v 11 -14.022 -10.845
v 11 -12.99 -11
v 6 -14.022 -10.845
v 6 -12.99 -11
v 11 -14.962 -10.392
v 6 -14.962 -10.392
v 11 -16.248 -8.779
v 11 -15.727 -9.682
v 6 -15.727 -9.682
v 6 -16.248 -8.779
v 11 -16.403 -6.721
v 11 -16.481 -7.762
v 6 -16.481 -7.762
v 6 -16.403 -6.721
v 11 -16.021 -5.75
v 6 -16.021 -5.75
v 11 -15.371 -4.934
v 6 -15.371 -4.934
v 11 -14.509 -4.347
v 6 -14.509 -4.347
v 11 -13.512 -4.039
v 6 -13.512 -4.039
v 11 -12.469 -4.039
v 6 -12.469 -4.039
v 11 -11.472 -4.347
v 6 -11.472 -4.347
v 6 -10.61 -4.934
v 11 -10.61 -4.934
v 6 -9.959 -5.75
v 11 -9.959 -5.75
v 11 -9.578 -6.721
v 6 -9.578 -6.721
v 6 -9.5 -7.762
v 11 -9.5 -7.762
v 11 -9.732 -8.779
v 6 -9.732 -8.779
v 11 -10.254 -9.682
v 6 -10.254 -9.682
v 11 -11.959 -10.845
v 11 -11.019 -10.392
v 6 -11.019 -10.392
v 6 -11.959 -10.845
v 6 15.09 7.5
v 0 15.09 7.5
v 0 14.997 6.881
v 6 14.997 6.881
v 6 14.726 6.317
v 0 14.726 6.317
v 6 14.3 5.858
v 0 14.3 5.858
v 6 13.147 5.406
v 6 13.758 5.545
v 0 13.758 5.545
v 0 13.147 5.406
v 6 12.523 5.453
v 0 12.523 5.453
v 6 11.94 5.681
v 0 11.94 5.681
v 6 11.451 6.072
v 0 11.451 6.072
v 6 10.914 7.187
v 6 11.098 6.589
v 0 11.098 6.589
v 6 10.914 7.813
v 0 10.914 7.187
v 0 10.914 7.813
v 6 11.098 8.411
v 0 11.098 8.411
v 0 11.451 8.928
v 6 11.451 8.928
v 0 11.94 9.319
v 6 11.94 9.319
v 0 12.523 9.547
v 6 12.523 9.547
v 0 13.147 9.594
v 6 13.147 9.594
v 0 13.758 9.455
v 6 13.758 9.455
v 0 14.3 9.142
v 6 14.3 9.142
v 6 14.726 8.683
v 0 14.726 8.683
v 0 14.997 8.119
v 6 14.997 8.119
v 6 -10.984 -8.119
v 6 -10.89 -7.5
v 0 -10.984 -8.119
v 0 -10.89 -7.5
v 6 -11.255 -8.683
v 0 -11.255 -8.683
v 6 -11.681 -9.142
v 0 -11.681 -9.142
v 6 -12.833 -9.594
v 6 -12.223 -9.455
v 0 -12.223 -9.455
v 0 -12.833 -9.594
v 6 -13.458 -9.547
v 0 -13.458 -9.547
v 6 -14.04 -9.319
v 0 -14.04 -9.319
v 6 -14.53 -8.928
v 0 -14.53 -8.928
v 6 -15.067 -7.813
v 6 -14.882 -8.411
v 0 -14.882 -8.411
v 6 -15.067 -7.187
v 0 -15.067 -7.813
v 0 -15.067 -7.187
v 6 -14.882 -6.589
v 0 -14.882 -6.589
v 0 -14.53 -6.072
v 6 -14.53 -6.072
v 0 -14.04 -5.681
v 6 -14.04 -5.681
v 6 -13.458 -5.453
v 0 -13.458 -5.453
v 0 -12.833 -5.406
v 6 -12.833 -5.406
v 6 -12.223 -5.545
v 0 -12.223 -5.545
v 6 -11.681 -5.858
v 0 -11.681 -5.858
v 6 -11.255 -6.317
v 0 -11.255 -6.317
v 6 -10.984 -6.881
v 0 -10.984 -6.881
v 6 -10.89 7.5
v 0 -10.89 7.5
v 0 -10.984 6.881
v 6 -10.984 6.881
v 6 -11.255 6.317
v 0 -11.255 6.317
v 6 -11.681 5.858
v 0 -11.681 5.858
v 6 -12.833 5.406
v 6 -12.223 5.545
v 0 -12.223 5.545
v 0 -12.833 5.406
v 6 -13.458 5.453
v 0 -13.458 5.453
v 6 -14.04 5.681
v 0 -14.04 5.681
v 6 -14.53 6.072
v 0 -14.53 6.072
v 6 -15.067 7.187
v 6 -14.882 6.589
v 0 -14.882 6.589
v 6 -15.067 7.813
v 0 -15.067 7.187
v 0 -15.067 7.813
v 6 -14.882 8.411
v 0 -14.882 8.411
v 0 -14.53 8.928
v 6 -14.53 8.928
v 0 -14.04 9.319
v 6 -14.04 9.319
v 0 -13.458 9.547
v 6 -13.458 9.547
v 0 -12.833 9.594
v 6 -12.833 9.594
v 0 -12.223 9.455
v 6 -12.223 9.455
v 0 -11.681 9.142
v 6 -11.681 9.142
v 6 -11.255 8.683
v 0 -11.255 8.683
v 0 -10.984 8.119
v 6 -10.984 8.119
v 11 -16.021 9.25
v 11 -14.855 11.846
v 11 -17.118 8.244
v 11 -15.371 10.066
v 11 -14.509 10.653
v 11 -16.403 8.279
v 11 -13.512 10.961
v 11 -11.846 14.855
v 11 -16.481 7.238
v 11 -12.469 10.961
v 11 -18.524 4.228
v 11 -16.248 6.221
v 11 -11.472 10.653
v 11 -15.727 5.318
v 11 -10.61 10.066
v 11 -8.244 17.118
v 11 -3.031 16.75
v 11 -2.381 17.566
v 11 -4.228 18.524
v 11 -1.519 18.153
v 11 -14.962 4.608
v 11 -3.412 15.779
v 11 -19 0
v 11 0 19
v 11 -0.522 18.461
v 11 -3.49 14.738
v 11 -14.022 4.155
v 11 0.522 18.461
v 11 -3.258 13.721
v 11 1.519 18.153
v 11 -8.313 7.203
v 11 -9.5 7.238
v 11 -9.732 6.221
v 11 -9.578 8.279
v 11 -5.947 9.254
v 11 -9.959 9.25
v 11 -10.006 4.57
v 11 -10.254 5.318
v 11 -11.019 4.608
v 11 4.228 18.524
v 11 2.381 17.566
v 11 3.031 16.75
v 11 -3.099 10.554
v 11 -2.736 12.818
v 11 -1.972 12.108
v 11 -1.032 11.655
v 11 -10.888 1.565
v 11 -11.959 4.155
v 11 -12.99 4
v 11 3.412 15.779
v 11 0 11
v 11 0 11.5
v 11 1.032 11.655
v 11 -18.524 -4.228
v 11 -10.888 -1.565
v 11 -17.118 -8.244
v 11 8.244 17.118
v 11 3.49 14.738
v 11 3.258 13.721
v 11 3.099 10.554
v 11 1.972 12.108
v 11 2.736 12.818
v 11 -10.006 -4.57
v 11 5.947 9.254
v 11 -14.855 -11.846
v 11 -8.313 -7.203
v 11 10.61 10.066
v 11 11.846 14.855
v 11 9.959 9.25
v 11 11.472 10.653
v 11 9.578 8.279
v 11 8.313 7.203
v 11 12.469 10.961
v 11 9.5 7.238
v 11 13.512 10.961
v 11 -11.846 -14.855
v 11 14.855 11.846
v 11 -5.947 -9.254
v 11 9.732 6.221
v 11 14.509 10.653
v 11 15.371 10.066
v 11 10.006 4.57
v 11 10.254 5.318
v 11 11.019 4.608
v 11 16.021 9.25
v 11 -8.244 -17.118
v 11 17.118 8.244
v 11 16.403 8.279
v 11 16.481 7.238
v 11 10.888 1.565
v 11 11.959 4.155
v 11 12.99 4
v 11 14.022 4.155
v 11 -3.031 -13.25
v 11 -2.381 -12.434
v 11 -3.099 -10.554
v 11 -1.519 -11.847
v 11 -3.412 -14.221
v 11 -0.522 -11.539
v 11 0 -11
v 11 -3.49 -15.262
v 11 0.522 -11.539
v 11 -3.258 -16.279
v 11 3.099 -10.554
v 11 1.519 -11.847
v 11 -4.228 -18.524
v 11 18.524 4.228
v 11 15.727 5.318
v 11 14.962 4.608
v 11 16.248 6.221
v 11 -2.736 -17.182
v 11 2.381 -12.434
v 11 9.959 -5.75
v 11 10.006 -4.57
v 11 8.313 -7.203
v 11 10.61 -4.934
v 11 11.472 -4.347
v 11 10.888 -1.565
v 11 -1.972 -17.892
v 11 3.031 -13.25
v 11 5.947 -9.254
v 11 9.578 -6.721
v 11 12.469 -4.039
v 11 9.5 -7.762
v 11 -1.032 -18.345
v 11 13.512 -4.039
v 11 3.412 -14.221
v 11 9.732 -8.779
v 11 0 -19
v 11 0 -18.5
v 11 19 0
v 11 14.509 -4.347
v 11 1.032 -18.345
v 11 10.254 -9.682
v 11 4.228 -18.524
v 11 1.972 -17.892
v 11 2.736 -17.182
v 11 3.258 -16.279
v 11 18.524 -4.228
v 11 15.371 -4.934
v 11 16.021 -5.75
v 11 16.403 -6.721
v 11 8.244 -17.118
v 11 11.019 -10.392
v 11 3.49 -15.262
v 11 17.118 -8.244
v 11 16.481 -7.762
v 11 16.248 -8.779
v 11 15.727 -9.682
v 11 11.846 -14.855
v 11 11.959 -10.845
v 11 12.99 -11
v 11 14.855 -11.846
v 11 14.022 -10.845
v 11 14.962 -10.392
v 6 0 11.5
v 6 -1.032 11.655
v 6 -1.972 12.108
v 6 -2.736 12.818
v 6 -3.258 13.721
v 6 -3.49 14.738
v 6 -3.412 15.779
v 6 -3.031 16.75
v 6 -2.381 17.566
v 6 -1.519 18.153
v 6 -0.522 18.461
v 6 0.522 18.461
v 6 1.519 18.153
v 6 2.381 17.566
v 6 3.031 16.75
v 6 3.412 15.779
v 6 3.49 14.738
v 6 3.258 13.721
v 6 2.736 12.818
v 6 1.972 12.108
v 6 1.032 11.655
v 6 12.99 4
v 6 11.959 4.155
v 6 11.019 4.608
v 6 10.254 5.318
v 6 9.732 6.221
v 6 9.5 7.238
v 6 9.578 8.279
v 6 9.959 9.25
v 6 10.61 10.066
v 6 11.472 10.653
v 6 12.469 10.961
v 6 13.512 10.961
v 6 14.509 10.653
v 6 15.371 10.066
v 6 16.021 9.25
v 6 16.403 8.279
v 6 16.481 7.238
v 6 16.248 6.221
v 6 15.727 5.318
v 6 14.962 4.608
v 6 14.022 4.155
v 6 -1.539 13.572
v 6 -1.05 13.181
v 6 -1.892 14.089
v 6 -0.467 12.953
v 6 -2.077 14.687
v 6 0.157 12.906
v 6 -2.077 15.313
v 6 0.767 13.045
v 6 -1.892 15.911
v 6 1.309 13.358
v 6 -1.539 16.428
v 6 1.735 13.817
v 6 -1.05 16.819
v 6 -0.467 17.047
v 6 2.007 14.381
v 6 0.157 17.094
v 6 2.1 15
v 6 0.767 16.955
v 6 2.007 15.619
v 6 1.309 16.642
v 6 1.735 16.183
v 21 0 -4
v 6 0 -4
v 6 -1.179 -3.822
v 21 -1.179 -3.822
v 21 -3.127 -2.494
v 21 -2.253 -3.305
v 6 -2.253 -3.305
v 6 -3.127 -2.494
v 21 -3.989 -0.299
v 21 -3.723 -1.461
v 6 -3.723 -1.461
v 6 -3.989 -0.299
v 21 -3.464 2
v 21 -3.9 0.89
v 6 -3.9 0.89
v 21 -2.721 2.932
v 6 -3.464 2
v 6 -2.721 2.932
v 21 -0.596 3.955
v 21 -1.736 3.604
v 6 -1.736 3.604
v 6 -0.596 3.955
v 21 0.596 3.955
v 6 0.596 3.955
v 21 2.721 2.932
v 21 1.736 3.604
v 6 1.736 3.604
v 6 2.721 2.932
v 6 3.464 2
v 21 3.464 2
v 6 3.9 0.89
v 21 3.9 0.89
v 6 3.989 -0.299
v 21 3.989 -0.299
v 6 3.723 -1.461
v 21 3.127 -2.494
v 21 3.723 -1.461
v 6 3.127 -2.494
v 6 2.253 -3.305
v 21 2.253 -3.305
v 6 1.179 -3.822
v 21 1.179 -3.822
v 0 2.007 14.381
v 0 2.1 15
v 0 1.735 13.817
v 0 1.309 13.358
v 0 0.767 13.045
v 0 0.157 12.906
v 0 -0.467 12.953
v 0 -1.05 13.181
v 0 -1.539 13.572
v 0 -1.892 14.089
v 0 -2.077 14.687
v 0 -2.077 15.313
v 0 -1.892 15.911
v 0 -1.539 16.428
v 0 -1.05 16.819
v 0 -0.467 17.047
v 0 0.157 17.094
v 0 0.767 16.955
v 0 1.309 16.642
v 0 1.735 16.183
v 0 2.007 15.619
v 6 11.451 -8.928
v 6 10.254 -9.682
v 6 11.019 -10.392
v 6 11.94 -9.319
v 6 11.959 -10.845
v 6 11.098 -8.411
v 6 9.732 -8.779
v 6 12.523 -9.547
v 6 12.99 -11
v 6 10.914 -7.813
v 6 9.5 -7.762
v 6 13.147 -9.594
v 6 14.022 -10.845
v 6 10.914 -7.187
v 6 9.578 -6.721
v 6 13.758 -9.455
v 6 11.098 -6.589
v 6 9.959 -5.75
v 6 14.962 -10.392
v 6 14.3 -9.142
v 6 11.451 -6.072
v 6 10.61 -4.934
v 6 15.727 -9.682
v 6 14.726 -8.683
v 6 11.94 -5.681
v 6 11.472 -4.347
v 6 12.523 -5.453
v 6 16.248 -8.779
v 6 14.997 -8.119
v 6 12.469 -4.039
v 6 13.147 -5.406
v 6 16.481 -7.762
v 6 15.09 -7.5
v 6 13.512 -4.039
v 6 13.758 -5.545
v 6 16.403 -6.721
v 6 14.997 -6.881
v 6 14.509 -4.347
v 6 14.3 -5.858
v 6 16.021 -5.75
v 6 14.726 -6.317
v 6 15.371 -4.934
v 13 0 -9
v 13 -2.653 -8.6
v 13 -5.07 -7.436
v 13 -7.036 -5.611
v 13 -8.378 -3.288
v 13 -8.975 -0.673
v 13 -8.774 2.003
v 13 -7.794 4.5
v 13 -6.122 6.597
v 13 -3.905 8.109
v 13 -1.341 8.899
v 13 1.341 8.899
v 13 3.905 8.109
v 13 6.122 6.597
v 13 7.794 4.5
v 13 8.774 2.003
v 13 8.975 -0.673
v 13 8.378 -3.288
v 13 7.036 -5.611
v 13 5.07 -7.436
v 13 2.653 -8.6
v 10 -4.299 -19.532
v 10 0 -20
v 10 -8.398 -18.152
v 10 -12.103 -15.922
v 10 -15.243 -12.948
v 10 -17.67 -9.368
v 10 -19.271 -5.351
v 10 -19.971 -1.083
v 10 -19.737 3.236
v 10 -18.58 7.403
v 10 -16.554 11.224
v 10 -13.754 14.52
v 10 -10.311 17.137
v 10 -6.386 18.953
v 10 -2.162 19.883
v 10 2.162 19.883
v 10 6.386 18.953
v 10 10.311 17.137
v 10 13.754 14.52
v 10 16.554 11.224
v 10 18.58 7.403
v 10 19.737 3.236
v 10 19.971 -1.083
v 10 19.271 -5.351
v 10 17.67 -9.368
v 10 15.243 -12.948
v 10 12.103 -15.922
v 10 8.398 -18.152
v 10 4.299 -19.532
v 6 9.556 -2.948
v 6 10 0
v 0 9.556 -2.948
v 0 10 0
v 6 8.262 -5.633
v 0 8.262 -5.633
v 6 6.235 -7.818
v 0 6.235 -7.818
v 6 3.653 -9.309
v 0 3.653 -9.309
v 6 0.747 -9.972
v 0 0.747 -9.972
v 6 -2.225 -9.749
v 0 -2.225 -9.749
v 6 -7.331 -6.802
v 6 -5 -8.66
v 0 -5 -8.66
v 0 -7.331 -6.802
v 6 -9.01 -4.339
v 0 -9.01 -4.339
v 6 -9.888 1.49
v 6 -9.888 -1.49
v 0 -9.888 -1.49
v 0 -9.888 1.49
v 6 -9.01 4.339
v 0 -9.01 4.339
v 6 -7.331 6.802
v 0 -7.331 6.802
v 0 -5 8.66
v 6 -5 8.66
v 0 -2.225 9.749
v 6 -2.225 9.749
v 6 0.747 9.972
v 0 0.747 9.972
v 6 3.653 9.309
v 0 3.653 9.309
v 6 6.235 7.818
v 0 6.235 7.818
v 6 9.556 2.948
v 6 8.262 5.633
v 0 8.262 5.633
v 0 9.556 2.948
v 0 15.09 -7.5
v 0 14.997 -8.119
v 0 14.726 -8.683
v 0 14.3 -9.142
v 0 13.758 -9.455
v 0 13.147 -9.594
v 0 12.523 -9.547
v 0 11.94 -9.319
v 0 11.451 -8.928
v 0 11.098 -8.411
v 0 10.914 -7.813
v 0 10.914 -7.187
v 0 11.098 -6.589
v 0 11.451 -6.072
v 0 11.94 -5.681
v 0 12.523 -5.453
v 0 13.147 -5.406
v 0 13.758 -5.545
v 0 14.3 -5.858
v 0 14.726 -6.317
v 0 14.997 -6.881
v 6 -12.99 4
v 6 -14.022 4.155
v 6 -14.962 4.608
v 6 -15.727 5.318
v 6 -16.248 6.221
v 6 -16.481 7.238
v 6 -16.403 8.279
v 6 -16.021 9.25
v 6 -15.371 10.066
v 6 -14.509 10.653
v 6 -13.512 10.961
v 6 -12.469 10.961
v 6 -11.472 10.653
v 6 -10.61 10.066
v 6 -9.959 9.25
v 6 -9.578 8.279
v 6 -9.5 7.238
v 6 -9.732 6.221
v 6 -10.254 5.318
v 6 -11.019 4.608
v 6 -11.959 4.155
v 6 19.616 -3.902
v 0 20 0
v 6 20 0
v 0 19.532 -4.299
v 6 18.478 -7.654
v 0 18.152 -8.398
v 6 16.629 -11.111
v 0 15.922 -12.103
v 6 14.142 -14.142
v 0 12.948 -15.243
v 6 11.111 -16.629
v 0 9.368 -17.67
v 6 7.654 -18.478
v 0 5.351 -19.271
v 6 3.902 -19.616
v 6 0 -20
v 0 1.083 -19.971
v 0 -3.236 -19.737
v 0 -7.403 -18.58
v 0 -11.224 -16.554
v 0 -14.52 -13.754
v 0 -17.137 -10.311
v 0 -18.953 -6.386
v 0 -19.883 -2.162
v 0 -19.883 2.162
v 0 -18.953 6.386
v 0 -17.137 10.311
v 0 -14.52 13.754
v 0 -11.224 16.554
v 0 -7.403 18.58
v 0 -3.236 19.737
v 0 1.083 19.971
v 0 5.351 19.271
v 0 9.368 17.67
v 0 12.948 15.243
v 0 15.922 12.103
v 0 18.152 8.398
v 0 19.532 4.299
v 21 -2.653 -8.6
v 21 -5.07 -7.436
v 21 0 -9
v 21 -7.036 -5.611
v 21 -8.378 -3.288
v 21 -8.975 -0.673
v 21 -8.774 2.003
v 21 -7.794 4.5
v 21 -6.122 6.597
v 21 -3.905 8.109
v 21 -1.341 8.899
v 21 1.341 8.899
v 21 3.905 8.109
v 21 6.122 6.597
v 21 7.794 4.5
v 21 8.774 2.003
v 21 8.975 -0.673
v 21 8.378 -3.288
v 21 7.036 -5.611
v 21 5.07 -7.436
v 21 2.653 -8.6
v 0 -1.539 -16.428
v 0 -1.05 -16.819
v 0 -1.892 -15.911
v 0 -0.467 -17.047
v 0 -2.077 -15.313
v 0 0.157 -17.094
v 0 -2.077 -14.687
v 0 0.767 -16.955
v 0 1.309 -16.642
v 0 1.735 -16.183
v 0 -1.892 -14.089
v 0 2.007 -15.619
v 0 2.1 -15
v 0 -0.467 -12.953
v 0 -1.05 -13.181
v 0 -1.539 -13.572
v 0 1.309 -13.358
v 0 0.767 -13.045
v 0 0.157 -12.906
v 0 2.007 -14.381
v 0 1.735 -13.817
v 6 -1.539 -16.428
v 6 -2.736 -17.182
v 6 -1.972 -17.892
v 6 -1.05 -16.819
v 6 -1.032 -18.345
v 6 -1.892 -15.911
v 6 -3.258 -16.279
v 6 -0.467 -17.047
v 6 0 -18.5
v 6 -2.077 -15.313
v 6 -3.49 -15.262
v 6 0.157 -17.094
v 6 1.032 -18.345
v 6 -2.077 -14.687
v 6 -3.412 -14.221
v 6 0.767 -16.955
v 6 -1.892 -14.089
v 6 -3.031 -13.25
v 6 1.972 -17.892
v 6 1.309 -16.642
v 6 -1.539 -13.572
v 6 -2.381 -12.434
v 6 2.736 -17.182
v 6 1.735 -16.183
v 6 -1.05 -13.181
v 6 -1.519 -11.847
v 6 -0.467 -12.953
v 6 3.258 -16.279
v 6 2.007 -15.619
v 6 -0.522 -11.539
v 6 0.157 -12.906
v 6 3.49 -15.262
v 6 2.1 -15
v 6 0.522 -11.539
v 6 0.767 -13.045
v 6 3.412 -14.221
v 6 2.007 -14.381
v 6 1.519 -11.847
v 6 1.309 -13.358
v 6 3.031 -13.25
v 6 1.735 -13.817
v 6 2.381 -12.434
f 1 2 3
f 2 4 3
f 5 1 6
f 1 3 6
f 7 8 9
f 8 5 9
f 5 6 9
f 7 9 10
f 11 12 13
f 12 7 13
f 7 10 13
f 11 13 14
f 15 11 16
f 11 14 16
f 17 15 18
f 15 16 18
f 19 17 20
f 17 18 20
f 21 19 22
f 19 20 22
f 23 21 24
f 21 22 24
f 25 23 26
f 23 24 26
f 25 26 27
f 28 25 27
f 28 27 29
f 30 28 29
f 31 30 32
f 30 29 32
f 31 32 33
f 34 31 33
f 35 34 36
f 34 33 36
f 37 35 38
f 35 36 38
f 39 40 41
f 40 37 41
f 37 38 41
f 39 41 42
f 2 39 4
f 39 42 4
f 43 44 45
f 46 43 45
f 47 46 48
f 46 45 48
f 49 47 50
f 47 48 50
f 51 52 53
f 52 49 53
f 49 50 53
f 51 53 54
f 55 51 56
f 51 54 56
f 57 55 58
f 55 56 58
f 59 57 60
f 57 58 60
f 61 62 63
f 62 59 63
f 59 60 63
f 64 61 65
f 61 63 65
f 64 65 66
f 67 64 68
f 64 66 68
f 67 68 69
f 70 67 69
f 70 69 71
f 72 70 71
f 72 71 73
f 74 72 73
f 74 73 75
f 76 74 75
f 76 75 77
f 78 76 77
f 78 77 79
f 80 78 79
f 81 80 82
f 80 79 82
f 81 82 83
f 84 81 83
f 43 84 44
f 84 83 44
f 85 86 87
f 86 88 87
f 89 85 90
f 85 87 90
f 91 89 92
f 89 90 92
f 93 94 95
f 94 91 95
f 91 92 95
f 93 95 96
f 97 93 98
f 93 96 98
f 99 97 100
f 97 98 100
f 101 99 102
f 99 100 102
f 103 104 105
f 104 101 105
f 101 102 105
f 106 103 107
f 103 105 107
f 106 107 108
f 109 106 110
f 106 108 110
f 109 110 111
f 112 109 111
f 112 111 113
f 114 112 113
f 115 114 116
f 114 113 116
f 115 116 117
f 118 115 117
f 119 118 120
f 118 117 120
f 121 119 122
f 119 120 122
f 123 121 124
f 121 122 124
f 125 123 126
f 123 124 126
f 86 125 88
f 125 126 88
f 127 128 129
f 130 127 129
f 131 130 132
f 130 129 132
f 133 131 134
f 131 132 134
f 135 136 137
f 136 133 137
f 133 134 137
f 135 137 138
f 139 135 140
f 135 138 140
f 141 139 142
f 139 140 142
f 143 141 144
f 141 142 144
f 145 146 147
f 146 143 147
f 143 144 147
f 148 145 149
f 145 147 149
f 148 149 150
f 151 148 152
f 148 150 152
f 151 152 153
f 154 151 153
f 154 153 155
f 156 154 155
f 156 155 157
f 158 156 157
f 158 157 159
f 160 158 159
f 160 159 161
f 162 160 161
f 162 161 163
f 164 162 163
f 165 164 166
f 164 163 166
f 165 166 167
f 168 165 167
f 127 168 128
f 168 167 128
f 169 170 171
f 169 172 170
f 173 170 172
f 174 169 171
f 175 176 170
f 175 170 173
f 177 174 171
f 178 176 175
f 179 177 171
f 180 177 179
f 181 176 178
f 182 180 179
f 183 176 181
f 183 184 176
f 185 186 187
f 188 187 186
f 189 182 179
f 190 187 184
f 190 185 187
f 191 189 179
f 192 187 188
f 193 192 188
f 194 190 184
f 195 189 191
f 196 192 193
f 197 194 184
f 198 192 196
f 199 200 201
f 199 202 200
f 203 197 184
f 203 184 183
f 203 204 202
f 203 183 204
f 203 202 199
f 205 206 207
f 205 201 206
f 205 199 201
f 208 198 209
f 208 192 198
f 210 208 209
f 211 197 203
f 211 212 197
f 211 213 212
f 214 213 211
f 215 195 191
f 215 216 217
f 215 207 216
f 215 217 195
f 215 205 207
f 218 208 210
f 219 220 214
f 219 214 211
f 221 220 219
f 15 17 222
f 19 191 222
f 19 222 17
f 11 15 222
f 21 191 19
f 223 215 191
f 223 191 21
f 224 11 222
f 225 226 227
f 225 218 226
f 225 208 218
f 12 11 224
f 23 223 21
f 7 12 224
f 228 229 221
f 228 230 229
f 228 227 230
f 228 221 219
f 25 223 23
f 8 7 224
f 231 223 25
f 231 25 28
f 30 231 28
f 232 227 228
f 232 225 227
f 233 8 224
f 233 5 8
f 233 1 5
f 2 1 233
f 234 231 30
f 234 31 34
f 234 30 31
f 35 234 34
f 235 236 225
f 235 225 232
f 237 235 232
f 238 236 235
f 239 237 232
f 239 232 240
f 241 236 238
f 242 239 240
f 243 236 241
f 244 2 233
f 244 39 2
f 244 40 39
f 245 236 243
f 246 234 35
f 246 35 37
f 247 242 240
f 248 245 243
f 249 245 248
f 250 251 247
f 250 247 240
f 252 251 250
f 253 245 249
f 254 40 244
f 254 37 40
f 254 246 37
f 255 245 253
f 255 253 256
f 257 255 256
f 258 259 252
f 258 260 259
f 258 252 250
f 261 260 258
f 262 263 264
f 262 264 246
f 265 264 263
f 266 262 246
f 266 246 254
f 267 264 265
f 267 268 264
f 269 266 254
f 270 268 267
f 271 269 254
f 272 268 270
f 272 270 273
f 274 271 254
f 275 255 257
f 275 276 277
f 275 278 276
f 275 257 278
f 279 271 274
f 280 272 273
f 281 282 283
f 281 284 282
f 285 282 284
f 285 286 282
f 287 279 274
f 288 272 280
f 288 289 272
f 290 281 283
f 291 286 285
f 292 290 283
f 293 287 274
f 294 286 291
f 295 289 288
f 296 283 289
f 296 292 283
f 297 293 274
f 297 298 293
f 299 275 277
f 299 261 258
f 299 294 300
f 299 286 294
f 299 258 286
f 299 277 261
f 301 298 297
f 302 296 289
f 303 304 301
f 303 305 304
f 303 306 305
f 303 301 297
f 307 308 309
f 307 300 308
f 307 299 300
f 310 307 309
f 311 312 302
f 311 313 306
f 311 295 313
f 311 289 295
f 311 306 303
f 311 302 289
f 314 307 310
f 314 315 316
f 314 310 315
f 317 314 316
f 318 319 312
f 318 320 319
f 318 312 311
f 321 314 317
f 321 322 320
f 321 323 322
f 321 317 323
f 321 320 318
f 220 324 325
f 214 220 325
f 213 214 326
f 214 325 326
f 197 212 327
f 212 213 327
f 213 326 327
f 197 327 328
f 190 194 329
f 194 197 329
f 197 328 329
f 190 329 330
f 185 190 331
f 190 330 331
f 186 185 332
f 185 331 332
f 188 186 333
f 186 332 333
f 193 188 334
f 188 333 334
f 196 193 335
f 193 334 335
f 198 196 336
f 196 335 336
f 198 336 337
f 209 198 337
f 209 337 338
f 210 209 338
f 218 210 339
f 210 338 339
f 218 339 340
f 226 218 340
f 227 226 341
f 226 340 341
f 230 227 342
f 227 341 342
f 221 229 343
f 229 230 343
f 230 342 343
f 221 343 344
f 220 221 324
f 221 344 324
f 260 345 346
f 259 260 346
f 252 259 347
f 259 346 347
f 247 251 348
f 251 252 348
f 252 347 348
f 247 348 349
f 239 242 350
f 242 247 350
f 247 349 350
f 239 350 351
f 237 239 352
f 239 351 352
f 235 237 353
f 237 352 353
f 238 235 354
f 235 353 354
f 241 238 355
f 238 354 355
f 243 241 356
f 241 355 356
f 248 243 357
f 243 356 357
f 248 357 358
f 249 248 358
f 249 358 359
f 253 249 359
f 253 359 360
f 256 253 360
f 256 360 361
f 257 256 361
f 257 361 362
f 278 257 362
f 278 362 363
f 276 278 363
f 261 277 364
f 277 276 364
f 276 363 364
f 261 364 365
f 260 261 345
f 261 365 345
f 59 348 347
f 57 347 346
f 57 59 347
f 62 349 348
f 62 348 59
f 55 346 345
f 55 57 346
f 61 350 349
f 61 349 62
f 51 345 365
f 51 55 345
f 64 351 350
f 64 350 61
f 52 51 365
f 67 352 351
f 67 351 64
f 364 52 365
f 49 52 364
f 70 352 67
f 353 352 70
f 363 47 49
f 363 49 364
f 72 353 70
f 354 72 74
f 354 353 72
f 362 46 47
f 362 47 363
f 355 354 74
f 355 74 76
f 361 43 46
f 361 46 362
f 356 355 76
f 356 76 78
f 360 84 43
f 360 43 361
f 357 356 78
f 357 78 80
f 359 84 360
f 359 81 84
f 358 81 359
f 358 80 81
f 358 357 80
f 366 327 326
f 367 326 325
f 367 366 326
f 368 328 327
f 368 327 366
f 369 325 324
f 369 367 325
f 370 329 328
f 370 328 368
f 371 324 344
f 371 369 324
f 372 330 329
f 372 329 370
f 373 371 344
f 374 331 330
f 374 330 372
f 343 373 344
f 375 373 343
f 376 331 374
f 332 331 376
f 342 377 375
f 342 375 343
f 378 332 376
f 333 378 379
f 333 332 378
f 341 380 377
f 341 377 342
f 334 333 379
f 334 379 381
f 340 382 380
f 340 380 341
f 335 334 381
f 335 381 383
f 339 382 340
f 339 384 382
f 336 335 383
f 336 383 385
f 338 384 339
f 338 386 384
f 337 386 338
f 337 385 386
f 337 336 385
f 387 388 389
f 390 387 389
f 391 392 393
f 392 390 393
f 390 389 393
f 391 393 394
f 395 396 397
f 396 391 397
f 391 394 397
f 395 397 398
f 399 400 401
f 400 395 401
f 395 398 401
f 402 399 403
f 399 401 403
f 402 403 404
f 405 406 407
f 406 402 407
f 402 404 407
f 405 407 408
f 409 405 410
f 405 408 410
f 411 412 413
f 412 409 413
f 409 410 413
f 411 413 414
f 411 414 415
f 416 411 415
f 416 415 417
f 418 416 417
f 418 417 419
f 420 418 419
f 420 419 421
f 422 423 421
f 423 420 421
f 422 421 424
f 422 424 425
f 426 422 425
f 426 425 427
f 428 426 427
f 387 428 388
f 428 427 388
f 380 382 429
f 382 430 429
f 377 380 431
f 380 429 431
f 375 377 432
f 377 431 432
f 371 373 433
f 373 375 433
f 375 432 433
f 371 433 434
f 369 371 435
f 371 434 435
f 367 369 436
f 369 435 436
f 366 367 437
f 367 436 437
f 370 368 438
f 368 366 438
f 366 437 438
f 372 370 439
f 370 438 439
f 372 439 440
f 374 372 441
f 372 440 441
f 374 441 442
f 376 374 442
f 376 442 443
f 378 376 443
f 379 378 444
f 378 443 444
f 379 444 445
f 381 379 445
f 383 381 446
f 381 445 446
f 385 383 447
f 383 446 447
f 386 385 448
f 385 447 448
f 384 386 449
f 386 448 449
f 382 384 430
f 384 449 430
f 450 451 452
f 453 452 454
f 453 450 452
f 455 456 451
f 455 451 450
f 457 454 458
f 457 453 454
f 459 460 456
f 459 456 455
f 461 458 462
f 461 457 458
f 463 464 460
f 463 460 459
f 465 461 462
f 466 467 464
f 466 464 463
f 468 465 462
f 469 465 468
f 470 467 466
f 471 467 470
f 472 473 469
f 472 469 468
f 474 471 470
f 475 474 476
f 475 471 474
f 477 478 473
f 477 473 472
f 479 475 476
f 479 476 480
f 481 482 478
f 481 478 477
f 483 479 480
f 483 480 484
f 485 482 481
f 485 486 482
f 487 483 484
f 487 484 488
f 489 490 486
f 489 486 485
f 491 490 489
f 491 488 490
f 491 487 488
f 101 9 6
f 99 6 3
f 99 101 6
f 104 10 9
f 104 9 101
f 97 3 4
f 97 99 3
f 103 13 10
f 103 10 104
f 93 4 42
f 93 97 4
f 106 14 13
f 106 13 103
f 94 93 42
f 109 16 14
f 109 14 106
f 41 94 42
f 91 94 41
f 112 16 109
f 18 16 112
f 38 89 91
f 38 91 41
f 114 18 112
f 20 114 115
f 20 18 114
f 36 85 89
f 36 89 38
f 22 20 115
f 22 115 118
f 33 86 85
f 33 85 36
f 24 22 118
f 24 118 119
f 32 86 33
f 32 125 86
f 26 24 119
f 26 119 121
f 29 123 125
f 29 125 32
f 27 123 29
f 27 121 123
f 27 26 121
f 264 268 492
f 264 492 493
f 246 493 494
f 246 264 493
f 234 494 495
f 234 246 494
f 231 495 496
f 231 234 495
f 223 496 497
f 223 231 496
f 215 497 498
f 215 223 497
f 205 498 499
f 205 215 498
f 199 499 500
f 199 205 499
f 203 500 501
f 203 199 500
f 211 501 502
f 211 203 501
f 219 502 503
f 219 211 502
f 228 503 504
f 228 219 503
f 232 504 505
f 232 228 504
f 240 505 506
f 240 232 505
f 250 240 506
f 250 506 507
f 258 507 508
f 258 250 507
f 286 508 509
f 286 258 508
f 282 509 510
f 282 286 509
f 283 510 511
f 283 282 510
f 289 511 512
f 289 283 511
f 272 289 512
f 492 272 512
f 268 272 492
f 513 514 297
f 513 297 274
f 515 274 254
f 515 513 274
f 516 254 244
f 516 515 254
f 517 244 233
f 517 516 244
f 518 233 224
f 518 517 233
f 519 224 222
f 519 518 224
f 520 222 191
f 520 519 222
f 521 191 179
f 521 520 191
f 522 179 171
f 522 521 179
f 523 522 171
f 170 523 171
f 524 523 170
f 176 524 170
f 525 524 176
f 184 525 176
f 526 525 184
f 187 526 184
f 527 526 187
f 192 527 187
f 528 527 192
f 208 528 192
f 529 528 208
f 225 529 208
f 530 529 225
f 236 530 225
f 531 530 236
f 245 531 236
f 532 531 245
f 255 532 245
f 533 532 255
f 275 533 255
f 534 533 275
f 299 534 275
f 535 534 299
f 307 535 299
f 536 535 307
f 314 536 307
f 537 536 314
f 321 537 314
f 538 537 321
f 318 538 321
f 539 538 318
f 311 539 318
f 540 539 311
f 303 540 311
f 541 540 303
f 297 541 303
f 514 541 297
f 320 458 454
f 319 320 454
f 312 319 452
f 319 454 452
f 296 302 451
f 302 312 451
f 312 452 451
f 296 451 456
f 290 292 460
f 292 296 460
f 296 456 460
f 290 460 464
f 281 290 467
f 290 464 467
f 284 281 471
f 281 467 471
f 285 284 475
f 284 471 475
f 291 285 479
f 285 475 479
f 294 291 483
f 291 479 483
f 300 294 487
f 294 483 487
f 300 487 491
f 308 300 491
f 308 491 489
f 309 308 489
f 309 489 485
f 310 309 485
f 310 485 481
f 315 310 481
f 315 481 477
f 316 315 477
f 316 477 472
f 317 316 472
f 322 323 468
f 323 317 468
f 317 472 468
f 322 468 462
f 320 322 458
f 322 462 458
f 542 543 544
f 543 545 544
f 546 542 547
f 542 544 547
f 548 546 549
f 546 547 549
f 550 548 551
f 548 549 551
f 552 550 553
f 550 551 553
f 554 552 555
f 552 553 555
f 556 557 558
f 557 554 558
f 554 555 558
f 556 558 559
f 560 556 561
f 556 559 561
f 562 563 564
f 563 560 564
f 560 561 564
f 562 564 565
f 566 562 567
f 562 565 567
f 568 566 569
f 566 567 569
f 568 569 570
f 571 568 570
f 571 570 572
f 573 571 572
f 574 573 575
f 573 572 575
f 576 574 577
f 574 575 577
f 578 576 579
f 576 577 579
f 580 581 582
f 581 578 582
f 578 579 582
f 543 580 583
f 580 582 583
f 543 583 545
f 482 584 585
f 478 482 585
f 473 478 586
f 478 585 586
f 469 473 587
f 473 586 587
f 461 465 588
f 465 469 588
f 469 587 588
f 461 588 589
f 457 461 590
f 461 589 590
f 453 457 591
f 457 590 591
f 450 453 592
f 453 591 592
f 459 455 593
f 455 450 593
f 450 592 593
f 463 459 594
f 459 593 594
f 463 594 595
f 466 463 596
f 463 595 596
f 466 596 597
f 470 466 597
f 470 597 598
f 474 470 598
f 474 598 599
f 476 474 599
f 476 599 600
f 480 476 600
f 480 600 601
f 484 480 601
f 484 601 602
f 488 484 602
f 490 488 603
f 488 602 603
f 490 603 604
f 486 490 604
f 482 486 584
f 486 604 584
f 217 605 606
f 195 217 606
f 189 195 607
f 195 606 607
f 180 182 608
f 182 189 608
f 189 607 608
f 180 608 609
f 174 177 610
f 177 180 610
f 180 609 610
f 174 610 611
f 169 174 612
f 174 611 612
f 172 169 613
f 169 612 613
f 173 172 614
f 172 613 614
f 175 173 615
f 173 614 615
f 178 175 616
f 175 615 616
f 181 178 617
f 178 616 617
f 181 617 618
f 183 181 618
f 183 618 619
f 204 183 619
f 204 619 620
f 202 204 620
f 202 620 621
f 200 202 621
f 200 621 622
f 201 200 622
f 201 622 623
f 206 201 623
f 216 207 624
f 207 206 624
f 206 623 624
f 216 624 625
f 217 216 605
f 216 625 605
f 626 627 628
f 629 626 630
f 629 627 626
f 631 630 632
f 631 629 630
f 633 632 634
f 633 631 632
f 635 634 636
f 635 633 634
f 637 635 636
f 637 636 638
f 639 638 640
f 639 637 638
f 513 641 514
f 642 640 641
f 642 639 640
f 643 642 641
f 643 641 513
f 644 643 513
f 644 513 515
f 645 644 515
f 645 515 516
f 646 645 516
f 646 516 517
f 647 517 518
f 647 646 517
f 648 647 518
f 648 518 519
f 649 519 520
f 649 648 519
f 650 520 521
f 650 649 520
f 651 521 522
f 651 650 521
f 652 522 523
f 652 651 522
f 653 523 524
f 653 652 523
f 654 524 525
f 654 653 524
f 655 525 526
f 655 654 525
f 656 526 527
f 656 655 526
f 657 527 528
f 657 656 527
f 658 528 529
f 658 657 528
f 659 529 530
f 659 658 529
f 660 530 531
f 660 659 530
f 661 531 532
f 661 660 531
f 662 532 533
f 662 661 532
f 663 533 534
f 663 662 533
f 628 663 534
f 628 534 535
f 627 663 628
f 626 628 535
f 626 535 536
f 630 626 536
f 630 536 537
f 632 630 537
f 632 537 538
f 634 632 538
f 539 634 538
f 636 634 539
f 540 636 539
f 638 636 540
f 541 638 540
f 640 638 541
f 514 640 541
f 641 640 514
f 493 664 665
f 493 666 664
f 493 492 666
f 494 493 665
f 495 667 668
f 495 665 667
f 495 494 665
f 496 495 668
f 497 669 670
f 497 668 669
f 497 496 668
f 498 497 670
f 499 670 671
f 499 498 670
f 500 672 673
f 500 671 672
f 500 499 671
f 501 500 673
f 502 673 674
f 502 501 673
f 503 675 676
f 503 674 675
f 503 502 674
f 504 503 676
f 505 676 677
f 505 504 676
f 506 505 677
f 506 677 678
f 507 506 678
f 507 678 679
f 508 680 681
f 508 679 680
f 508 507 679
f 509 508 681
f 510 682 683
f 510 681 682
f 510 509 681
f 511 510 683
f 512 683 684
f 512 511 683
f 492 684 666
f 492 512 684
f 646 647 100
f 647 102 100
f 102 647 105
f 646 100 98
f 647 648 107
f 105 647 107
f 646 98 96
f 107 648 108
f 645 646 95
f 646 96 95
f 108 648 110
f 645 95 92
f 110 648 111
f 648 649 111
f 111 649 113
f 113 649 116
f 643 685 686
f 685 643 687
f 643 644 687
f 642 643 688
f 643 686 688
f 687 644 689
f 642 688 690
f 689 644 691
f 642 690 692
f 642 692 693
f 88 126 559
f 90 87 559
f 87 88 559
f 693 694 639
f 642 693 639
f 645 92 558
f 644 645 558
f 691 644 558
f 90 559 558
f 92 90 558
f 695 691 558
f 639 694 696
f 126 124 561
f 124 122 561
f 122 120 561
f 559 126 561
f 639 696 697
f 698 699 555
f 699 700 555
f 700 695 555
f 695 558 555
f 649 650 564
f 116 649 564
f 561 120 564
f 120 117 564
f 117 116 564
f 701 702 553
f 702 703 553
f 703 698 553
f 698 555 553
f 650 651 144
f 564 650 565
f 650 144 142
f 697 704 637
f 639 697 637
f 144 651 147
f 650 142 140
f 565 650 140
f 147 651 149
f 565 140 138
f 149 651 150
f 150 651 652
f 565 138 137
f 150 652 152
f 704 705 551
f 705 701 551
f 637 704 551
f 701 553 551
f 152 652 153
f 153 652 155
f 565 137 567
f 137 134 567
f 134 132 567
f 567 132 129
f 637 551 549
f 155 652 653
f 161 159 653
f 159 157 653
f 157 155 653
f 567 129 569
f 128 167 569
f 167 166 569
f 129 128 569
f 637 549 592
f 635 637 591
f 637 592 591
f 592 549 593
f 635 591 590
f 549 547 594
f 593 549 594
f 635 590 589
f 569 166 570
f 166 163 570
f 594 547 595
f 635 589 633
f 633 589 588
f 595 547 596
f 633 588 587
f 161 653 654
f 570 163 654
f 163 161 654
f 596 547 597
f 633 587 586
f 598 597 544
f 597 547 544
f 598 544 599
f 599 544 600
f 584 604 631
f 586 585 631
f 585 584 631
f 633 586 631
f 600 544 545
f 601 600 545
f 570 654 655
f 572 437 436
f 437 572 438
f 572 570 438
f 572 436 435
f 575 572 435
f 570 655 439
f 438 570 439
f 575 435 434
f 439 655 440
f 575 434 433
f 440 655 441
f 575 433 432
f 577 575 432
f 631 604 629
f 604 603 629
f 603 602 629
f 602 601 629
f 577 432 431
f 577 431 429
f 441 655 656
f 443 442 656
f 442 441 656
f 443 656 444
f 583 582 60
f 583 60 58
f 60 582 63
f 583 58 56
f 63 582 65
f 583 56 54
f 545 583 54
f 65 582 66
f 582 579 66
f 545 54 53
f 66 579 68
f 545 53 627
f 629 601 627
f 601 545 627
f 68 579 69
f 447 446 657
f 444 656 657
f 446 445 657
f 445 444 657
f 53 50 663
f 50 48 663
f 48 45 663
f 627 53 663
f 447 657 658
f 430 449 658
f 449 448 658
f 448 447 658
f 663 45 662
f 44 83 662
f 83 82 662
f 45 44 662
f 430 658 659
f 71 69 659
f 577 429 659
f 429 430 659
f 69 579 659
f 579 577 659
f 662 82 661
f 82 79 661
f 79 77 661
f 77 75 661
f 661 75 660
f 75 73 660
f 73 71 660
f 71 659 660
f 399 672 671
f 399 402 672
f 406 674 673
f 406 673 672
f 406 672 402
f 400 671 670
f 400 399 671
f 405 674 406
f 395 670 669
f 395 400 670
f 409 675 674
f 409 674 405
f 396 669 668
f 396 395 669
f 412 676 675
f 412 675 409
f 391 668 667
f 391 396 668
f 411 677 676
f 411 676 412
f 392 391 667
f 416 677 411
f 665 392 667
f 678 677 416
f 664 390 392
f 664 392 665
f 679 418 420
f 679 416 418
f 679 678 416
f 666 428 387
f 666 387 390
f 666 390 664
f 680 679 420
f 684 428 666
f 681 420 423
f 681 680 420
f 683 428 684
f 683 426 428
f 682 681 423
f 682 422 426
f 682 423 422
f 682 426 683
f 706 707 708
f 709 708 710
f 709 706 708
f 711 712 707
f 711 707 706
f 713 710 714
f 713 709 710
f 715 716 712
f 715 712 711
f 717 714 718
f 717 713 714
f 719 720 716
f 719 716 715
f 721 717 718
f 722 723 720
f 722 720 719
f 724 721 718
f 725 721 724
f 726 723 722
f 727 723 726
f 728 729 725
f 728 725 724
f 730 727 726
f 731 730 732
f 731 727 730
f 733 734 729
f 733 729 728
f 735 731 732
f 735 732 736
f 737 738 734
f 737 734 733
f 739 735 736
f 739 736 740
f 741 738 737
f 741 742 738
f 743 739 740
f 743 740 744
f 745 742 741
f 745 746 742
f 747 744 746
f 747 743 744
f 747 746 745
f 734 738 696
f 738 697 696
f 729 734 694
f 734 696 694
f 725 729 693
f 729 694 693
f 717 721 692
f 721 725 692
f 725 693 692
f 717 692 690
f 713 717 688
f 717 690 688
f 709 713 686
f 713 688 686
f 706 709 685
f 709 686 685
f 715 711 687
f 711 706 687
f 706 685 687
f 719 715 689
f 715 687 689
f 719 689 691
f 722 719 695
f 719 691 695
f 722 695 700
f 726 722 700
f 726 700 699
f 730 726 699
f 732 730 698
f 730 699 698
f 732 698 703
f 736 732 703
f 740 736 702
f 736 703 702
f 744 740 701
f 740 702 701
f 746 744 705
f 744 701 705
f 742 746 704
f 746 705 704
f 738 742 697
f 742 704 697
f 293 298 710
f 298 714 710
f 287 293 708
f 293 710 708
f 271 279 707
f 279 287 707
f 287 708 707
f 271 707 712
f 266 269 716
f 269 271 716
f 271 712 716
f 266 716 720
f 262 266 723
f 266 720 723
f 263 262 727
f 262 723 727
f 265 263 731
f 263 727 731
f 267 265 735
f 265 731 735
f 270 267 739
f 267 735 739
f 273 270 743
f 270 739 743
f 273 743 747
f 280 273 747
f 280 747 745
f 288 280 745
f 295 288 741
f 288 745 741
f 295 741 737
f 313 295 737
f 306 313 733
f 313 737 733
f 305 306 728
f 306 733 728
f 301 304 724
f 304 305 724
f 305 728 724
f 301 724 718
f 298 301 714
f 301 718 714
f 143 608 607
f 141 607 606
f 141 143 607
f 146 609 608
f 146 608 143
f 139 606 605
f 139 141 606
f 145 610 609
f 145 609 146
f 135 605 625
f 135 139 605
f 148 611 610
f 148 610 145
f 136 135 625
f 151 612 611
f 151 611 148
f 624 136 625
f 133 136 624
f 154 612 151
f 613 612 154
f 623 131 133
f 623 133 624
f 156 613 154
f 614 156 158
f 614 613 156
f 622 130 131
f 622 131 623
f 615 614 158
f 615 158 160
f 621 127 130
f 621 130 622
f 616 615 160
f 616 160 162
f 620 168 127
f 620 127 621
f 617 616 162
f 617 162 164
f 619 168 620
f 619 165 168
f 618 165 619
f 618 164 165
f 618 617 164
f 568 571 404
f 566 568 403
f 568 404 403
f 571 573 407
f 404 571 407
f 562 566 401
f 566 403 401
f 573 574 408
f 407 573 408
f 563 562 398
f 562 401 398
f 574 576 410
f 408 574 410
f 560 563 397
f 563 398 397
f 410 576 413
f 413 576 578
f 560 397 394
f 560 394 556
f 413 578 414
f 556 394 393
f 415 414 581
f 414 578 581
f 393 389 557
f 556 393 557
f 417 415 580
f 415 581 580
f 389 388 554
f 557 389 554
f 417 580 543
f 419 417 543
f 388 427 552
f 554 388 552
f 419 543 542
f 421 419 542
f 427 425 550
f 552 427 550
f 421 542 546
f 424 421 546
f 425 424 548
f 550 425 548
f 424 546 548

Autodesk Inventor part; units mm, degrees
ref_plane "YZ Plane" through (0, 0, 0) normal (1, 0, 0) x (0, 1, 0)
ref_plane "XZ Plane" through (0, 0, 0) normal (0, 1, 0) x (-1, 0, 0)
ref_plane "XY Plane" through (0, 0, 0) normal (0, 0, 1) x (1, 0, 0)
sketch "草图1" plane through (0, 0, 0) normal (1, 0, 0) x (0, 1, 0)
  circle A0 centre (0, 0) radius 15 construction
  line L0 (0, 0) -> (0, -15) construction
  circle A1 centre (0, 0) radius 10
  circle A2 centre (0, -15) radius 2.1
  circle A3 centre (12.9904, -7.5) radius 2.1
  circle A4 centre (12.9904, 7.5) radius 2.1
  circle A5 centre (0, 15) radius 2.1
  circle A6 centre (-12.9904, 7.5) radius 2.1
  circle A7 centre (-12.9904, -7.5) radius 2.1
  circle A8 centre (0, 0) radius 20
  dimension "d0" = 30
  dimension "d1" = 20
  dimension "d2" = 4.2
  dimension "d5" = 360
  dimension "d7" = 40
extrude "拉伸1" add sketch "草图1" along normal blind 6
sketch "草图2" plane through (6, 0, 0) normal (1, 0, 0) x (0, 0, -1)
  circle A0 centre (0, 0) radius 4
  circle A1 centre (0, 0) radius 20 projected
  circle A2 centre (15, 0) radius 2.1 projected
  circle A3 centre (15, 0) radius 3.5
  circle A4 centre (7.5, 12.9904) radius 3.5
  circle A5 centre (-7.5, 12.9904) radius 3.5
  circle A6 centre (-15, 0) radius 3.5
  circle A7 centre (-7.5, -12.9904) radius 3.5
  circle A8 centre (7.5, -12.9904) radius 3.5
  dimension "d10" = 8
  dimension "d11" = 7
  dimension "d14" = 360
extrude "拉伸2" add sketch "草图2" along normal blind 5 contours A1
sketch "草图3" plane through (11, 0, 0) normal (1, 0, 0) x (0, 0, -1)
  circle A0 centre (0, 0) radius 4 projected
  circle A1 centre (0, 0) radius 9
  dimension "d18" = 18
extrude "拉伸3" add sketch "草图3" along normal blind 10
chamfer "倒角1" distance 2 angle 45 1 edges at (11, 0, 9)
chamfer "倒角2" distance 1 angle 45 1 edges at (11, 0, 20)
properties part number "链轮摇臂座"
